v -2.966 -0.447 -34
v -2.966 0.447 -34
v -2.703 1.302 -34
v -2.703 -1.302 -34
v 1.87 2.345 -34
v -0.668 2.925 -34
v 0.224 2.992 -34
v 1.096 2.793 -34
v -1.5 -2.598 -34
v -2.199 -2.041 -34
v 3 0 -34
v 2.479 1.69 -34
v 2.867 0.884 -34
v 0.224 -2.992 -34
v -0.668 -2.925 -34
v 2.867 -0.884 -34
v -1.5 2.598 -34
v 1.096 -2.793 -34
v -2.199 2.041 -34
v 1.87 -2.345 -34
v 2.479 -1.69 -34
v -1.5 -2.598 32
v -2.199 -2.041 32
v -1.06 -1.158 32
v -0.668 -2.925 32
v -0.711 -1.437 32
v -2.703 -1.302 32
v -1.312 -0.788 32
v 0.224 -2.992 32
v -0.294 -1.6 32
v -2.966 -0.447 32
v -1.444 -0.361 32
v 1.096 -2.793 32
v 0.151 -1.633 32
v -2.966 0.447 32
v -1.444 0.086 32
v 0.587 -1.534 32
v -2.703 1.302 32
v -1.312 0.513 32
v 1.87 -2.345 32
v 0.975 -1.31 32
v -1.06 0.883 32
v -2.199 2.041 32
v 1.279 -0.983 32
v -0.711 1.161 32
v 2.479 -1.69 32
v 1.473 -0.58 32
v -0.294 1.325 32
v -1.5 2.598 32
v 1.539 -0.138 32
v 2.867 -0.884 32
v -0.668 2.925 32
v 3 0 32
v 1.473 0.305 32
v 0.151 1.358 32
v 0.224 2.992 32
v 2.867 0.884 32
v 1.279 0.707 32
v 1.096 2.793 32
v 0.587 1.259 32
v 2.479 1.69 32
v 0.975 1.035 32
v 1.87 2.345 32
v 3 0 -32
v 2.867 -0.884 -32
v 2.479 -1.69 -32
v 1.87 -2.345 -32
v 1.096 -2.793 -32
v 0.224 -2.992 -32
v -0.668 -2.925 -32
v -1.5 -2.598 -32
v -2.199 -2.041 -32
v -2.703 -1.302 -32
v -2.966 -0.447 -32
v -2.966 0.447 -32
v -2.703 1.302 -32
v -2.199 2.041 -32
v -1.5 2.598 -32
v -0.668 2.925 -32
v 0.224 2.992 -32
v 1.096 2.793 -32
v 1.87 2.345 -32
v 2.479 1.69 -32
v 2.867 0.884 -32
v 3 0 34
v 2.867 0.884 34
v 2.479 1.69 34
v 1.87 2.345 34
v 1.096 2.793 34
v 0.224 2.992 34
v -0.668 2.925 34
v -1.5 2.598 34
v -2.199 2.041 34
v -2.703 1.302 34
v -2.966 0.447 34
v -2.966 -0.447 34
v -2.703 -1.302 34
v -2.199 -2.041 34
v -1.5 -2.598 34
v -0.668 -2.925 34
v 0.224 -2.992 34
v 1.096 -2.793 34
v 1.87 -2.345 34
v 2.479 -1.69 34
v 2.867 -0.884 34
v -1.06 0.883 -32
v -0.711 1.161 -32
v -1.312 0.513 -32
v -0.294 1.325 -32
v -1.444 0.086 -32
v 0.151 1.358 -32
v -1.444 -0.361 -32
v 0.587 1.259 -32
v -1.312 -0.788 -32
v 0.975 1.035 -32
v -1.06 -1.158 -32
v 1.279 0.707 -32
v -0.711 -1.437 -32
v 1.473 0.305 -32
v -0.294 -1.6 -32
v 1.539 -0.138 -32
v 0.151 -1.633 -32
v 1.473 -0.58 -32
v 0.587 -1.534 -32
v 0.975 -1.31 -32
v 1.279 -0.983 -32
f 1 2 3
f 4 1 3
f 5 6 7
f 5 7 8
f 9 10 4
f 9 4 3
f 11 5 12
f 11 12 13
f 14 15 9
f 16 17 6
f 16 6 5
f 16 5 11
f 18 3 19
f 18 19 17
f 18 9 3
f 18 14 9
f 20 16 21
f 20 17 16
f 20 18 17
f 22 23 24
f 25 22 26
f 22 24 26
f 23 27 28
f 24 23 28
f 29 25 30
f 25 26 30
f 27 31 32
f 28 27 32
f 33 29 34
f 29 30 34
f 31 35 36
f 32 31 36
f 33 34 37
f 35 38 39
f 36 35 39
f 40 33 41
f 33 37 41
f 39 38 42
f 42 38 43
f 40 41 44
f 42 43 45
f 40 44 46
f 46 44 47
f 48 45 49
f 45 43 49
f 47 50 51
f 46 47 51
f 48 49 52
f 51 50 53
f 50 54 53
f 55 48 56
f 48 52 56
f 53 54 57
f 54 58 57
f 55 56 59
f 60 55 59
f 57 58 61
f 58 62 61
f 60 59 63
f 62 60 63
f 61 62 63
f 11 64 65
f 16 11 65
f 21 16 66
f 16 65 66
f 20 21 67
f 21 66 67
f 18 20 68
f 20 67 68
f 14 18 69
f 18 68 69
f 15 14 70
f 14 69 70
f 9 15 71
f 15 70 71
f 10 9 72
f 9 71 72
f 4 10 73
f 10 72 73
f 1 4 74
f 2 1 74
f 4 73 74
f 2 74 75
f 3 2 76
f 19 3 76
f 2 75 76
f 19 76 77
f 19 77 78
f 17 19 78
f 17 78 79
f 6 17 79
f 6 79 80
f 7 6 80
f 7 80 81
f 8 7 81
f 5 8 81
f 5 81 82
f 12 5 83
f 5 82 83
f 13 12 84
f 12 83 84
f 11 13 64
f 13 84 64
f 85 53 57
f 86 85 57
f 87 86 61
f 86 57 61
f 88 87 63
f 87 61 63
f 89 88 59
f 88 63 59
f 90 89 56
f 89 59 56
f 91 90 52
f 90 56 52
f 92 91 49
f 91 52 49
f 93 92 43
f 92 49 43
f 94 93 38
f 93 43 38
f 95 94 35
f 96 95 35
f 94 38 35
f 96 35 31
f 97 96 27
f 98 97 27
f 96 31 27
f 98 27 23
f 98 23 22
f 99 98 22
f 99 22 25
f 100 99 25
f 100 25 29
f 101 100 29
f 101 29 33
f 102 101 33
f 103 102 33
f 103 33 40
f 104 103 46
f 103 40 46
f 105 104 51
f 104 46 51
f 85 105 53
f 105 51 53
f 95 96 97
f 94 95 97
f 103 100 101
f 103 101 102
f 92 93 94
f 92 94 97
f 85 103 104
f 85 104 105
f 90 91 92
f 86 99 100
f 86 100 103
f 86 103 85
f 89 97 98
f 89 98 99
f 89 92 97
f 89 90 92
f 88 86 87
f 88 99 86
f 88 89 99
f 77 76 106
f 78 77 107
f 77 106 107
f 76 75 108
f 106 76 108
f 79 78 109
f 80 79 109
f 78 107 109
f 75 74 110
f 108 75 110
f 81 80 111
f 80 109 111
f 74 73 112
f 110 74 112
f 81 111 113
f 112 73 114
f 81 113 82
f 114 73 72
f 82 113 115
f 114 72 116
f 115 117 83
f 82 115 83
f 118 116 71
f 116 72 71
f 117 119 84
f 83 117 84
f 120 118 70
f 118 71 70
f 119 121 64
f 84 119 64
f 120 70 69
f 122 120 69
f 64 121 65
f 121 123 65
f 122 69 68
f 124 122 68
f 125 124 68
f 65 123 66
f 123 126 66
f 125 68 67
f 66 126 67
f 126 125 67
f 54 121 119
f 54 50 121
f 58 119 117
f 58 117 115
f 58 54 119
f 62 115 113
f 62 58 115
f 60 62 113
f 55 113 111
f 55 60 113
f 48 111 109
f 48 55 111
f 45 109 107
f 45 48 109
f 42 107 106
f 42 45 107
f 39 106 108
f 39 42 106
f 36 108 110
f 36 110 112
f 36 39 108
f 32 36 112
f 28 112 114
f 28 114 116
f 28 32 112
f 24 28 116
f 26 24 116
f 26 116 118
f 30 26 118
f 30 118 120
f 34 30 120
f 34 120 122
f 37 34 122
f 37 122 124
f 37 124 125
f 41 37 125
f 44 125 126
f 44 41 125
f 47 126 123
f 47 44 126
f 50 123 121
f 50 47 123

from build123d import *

# Parameters (mm, degrees)
SKETCH_R     = 1.5
PAD_DEPTH    = 32
SKETCH001_R  = 3
PAD001_DEPTH = 2
SKETCH002_R  = 3
PAD002_DEPTH = 2


with BuildPart() as part:
    # Sketch → Pad (new body, symmetric)
    with BuildSketch(Plane.XY):
        with Locations((0.039321, -0.137621)):
            Circle(SKETCH_R)
    extrude(amount=PAD_DEPTH, both=True)

    # Sketch001 (on Face2 of Pad) → Pad001 (join)
    with BuildSketch(Plane(origin=(0, 0, -32), x_dir=(1, 0, 0), z_dir=(0, 0, -1))):
        Circle(SKETCH001_R)
    extrude(amount=PAD001_DEPTH)

    # Sketch002 (on Face5 of Pad001) → Pad002 (join)
    with BuildSketch(Plane.XY.offset(32)):
        Circle(SKETCH002_R)
    extrude(amount=PAD002_DEPTH)


solid = part.part
